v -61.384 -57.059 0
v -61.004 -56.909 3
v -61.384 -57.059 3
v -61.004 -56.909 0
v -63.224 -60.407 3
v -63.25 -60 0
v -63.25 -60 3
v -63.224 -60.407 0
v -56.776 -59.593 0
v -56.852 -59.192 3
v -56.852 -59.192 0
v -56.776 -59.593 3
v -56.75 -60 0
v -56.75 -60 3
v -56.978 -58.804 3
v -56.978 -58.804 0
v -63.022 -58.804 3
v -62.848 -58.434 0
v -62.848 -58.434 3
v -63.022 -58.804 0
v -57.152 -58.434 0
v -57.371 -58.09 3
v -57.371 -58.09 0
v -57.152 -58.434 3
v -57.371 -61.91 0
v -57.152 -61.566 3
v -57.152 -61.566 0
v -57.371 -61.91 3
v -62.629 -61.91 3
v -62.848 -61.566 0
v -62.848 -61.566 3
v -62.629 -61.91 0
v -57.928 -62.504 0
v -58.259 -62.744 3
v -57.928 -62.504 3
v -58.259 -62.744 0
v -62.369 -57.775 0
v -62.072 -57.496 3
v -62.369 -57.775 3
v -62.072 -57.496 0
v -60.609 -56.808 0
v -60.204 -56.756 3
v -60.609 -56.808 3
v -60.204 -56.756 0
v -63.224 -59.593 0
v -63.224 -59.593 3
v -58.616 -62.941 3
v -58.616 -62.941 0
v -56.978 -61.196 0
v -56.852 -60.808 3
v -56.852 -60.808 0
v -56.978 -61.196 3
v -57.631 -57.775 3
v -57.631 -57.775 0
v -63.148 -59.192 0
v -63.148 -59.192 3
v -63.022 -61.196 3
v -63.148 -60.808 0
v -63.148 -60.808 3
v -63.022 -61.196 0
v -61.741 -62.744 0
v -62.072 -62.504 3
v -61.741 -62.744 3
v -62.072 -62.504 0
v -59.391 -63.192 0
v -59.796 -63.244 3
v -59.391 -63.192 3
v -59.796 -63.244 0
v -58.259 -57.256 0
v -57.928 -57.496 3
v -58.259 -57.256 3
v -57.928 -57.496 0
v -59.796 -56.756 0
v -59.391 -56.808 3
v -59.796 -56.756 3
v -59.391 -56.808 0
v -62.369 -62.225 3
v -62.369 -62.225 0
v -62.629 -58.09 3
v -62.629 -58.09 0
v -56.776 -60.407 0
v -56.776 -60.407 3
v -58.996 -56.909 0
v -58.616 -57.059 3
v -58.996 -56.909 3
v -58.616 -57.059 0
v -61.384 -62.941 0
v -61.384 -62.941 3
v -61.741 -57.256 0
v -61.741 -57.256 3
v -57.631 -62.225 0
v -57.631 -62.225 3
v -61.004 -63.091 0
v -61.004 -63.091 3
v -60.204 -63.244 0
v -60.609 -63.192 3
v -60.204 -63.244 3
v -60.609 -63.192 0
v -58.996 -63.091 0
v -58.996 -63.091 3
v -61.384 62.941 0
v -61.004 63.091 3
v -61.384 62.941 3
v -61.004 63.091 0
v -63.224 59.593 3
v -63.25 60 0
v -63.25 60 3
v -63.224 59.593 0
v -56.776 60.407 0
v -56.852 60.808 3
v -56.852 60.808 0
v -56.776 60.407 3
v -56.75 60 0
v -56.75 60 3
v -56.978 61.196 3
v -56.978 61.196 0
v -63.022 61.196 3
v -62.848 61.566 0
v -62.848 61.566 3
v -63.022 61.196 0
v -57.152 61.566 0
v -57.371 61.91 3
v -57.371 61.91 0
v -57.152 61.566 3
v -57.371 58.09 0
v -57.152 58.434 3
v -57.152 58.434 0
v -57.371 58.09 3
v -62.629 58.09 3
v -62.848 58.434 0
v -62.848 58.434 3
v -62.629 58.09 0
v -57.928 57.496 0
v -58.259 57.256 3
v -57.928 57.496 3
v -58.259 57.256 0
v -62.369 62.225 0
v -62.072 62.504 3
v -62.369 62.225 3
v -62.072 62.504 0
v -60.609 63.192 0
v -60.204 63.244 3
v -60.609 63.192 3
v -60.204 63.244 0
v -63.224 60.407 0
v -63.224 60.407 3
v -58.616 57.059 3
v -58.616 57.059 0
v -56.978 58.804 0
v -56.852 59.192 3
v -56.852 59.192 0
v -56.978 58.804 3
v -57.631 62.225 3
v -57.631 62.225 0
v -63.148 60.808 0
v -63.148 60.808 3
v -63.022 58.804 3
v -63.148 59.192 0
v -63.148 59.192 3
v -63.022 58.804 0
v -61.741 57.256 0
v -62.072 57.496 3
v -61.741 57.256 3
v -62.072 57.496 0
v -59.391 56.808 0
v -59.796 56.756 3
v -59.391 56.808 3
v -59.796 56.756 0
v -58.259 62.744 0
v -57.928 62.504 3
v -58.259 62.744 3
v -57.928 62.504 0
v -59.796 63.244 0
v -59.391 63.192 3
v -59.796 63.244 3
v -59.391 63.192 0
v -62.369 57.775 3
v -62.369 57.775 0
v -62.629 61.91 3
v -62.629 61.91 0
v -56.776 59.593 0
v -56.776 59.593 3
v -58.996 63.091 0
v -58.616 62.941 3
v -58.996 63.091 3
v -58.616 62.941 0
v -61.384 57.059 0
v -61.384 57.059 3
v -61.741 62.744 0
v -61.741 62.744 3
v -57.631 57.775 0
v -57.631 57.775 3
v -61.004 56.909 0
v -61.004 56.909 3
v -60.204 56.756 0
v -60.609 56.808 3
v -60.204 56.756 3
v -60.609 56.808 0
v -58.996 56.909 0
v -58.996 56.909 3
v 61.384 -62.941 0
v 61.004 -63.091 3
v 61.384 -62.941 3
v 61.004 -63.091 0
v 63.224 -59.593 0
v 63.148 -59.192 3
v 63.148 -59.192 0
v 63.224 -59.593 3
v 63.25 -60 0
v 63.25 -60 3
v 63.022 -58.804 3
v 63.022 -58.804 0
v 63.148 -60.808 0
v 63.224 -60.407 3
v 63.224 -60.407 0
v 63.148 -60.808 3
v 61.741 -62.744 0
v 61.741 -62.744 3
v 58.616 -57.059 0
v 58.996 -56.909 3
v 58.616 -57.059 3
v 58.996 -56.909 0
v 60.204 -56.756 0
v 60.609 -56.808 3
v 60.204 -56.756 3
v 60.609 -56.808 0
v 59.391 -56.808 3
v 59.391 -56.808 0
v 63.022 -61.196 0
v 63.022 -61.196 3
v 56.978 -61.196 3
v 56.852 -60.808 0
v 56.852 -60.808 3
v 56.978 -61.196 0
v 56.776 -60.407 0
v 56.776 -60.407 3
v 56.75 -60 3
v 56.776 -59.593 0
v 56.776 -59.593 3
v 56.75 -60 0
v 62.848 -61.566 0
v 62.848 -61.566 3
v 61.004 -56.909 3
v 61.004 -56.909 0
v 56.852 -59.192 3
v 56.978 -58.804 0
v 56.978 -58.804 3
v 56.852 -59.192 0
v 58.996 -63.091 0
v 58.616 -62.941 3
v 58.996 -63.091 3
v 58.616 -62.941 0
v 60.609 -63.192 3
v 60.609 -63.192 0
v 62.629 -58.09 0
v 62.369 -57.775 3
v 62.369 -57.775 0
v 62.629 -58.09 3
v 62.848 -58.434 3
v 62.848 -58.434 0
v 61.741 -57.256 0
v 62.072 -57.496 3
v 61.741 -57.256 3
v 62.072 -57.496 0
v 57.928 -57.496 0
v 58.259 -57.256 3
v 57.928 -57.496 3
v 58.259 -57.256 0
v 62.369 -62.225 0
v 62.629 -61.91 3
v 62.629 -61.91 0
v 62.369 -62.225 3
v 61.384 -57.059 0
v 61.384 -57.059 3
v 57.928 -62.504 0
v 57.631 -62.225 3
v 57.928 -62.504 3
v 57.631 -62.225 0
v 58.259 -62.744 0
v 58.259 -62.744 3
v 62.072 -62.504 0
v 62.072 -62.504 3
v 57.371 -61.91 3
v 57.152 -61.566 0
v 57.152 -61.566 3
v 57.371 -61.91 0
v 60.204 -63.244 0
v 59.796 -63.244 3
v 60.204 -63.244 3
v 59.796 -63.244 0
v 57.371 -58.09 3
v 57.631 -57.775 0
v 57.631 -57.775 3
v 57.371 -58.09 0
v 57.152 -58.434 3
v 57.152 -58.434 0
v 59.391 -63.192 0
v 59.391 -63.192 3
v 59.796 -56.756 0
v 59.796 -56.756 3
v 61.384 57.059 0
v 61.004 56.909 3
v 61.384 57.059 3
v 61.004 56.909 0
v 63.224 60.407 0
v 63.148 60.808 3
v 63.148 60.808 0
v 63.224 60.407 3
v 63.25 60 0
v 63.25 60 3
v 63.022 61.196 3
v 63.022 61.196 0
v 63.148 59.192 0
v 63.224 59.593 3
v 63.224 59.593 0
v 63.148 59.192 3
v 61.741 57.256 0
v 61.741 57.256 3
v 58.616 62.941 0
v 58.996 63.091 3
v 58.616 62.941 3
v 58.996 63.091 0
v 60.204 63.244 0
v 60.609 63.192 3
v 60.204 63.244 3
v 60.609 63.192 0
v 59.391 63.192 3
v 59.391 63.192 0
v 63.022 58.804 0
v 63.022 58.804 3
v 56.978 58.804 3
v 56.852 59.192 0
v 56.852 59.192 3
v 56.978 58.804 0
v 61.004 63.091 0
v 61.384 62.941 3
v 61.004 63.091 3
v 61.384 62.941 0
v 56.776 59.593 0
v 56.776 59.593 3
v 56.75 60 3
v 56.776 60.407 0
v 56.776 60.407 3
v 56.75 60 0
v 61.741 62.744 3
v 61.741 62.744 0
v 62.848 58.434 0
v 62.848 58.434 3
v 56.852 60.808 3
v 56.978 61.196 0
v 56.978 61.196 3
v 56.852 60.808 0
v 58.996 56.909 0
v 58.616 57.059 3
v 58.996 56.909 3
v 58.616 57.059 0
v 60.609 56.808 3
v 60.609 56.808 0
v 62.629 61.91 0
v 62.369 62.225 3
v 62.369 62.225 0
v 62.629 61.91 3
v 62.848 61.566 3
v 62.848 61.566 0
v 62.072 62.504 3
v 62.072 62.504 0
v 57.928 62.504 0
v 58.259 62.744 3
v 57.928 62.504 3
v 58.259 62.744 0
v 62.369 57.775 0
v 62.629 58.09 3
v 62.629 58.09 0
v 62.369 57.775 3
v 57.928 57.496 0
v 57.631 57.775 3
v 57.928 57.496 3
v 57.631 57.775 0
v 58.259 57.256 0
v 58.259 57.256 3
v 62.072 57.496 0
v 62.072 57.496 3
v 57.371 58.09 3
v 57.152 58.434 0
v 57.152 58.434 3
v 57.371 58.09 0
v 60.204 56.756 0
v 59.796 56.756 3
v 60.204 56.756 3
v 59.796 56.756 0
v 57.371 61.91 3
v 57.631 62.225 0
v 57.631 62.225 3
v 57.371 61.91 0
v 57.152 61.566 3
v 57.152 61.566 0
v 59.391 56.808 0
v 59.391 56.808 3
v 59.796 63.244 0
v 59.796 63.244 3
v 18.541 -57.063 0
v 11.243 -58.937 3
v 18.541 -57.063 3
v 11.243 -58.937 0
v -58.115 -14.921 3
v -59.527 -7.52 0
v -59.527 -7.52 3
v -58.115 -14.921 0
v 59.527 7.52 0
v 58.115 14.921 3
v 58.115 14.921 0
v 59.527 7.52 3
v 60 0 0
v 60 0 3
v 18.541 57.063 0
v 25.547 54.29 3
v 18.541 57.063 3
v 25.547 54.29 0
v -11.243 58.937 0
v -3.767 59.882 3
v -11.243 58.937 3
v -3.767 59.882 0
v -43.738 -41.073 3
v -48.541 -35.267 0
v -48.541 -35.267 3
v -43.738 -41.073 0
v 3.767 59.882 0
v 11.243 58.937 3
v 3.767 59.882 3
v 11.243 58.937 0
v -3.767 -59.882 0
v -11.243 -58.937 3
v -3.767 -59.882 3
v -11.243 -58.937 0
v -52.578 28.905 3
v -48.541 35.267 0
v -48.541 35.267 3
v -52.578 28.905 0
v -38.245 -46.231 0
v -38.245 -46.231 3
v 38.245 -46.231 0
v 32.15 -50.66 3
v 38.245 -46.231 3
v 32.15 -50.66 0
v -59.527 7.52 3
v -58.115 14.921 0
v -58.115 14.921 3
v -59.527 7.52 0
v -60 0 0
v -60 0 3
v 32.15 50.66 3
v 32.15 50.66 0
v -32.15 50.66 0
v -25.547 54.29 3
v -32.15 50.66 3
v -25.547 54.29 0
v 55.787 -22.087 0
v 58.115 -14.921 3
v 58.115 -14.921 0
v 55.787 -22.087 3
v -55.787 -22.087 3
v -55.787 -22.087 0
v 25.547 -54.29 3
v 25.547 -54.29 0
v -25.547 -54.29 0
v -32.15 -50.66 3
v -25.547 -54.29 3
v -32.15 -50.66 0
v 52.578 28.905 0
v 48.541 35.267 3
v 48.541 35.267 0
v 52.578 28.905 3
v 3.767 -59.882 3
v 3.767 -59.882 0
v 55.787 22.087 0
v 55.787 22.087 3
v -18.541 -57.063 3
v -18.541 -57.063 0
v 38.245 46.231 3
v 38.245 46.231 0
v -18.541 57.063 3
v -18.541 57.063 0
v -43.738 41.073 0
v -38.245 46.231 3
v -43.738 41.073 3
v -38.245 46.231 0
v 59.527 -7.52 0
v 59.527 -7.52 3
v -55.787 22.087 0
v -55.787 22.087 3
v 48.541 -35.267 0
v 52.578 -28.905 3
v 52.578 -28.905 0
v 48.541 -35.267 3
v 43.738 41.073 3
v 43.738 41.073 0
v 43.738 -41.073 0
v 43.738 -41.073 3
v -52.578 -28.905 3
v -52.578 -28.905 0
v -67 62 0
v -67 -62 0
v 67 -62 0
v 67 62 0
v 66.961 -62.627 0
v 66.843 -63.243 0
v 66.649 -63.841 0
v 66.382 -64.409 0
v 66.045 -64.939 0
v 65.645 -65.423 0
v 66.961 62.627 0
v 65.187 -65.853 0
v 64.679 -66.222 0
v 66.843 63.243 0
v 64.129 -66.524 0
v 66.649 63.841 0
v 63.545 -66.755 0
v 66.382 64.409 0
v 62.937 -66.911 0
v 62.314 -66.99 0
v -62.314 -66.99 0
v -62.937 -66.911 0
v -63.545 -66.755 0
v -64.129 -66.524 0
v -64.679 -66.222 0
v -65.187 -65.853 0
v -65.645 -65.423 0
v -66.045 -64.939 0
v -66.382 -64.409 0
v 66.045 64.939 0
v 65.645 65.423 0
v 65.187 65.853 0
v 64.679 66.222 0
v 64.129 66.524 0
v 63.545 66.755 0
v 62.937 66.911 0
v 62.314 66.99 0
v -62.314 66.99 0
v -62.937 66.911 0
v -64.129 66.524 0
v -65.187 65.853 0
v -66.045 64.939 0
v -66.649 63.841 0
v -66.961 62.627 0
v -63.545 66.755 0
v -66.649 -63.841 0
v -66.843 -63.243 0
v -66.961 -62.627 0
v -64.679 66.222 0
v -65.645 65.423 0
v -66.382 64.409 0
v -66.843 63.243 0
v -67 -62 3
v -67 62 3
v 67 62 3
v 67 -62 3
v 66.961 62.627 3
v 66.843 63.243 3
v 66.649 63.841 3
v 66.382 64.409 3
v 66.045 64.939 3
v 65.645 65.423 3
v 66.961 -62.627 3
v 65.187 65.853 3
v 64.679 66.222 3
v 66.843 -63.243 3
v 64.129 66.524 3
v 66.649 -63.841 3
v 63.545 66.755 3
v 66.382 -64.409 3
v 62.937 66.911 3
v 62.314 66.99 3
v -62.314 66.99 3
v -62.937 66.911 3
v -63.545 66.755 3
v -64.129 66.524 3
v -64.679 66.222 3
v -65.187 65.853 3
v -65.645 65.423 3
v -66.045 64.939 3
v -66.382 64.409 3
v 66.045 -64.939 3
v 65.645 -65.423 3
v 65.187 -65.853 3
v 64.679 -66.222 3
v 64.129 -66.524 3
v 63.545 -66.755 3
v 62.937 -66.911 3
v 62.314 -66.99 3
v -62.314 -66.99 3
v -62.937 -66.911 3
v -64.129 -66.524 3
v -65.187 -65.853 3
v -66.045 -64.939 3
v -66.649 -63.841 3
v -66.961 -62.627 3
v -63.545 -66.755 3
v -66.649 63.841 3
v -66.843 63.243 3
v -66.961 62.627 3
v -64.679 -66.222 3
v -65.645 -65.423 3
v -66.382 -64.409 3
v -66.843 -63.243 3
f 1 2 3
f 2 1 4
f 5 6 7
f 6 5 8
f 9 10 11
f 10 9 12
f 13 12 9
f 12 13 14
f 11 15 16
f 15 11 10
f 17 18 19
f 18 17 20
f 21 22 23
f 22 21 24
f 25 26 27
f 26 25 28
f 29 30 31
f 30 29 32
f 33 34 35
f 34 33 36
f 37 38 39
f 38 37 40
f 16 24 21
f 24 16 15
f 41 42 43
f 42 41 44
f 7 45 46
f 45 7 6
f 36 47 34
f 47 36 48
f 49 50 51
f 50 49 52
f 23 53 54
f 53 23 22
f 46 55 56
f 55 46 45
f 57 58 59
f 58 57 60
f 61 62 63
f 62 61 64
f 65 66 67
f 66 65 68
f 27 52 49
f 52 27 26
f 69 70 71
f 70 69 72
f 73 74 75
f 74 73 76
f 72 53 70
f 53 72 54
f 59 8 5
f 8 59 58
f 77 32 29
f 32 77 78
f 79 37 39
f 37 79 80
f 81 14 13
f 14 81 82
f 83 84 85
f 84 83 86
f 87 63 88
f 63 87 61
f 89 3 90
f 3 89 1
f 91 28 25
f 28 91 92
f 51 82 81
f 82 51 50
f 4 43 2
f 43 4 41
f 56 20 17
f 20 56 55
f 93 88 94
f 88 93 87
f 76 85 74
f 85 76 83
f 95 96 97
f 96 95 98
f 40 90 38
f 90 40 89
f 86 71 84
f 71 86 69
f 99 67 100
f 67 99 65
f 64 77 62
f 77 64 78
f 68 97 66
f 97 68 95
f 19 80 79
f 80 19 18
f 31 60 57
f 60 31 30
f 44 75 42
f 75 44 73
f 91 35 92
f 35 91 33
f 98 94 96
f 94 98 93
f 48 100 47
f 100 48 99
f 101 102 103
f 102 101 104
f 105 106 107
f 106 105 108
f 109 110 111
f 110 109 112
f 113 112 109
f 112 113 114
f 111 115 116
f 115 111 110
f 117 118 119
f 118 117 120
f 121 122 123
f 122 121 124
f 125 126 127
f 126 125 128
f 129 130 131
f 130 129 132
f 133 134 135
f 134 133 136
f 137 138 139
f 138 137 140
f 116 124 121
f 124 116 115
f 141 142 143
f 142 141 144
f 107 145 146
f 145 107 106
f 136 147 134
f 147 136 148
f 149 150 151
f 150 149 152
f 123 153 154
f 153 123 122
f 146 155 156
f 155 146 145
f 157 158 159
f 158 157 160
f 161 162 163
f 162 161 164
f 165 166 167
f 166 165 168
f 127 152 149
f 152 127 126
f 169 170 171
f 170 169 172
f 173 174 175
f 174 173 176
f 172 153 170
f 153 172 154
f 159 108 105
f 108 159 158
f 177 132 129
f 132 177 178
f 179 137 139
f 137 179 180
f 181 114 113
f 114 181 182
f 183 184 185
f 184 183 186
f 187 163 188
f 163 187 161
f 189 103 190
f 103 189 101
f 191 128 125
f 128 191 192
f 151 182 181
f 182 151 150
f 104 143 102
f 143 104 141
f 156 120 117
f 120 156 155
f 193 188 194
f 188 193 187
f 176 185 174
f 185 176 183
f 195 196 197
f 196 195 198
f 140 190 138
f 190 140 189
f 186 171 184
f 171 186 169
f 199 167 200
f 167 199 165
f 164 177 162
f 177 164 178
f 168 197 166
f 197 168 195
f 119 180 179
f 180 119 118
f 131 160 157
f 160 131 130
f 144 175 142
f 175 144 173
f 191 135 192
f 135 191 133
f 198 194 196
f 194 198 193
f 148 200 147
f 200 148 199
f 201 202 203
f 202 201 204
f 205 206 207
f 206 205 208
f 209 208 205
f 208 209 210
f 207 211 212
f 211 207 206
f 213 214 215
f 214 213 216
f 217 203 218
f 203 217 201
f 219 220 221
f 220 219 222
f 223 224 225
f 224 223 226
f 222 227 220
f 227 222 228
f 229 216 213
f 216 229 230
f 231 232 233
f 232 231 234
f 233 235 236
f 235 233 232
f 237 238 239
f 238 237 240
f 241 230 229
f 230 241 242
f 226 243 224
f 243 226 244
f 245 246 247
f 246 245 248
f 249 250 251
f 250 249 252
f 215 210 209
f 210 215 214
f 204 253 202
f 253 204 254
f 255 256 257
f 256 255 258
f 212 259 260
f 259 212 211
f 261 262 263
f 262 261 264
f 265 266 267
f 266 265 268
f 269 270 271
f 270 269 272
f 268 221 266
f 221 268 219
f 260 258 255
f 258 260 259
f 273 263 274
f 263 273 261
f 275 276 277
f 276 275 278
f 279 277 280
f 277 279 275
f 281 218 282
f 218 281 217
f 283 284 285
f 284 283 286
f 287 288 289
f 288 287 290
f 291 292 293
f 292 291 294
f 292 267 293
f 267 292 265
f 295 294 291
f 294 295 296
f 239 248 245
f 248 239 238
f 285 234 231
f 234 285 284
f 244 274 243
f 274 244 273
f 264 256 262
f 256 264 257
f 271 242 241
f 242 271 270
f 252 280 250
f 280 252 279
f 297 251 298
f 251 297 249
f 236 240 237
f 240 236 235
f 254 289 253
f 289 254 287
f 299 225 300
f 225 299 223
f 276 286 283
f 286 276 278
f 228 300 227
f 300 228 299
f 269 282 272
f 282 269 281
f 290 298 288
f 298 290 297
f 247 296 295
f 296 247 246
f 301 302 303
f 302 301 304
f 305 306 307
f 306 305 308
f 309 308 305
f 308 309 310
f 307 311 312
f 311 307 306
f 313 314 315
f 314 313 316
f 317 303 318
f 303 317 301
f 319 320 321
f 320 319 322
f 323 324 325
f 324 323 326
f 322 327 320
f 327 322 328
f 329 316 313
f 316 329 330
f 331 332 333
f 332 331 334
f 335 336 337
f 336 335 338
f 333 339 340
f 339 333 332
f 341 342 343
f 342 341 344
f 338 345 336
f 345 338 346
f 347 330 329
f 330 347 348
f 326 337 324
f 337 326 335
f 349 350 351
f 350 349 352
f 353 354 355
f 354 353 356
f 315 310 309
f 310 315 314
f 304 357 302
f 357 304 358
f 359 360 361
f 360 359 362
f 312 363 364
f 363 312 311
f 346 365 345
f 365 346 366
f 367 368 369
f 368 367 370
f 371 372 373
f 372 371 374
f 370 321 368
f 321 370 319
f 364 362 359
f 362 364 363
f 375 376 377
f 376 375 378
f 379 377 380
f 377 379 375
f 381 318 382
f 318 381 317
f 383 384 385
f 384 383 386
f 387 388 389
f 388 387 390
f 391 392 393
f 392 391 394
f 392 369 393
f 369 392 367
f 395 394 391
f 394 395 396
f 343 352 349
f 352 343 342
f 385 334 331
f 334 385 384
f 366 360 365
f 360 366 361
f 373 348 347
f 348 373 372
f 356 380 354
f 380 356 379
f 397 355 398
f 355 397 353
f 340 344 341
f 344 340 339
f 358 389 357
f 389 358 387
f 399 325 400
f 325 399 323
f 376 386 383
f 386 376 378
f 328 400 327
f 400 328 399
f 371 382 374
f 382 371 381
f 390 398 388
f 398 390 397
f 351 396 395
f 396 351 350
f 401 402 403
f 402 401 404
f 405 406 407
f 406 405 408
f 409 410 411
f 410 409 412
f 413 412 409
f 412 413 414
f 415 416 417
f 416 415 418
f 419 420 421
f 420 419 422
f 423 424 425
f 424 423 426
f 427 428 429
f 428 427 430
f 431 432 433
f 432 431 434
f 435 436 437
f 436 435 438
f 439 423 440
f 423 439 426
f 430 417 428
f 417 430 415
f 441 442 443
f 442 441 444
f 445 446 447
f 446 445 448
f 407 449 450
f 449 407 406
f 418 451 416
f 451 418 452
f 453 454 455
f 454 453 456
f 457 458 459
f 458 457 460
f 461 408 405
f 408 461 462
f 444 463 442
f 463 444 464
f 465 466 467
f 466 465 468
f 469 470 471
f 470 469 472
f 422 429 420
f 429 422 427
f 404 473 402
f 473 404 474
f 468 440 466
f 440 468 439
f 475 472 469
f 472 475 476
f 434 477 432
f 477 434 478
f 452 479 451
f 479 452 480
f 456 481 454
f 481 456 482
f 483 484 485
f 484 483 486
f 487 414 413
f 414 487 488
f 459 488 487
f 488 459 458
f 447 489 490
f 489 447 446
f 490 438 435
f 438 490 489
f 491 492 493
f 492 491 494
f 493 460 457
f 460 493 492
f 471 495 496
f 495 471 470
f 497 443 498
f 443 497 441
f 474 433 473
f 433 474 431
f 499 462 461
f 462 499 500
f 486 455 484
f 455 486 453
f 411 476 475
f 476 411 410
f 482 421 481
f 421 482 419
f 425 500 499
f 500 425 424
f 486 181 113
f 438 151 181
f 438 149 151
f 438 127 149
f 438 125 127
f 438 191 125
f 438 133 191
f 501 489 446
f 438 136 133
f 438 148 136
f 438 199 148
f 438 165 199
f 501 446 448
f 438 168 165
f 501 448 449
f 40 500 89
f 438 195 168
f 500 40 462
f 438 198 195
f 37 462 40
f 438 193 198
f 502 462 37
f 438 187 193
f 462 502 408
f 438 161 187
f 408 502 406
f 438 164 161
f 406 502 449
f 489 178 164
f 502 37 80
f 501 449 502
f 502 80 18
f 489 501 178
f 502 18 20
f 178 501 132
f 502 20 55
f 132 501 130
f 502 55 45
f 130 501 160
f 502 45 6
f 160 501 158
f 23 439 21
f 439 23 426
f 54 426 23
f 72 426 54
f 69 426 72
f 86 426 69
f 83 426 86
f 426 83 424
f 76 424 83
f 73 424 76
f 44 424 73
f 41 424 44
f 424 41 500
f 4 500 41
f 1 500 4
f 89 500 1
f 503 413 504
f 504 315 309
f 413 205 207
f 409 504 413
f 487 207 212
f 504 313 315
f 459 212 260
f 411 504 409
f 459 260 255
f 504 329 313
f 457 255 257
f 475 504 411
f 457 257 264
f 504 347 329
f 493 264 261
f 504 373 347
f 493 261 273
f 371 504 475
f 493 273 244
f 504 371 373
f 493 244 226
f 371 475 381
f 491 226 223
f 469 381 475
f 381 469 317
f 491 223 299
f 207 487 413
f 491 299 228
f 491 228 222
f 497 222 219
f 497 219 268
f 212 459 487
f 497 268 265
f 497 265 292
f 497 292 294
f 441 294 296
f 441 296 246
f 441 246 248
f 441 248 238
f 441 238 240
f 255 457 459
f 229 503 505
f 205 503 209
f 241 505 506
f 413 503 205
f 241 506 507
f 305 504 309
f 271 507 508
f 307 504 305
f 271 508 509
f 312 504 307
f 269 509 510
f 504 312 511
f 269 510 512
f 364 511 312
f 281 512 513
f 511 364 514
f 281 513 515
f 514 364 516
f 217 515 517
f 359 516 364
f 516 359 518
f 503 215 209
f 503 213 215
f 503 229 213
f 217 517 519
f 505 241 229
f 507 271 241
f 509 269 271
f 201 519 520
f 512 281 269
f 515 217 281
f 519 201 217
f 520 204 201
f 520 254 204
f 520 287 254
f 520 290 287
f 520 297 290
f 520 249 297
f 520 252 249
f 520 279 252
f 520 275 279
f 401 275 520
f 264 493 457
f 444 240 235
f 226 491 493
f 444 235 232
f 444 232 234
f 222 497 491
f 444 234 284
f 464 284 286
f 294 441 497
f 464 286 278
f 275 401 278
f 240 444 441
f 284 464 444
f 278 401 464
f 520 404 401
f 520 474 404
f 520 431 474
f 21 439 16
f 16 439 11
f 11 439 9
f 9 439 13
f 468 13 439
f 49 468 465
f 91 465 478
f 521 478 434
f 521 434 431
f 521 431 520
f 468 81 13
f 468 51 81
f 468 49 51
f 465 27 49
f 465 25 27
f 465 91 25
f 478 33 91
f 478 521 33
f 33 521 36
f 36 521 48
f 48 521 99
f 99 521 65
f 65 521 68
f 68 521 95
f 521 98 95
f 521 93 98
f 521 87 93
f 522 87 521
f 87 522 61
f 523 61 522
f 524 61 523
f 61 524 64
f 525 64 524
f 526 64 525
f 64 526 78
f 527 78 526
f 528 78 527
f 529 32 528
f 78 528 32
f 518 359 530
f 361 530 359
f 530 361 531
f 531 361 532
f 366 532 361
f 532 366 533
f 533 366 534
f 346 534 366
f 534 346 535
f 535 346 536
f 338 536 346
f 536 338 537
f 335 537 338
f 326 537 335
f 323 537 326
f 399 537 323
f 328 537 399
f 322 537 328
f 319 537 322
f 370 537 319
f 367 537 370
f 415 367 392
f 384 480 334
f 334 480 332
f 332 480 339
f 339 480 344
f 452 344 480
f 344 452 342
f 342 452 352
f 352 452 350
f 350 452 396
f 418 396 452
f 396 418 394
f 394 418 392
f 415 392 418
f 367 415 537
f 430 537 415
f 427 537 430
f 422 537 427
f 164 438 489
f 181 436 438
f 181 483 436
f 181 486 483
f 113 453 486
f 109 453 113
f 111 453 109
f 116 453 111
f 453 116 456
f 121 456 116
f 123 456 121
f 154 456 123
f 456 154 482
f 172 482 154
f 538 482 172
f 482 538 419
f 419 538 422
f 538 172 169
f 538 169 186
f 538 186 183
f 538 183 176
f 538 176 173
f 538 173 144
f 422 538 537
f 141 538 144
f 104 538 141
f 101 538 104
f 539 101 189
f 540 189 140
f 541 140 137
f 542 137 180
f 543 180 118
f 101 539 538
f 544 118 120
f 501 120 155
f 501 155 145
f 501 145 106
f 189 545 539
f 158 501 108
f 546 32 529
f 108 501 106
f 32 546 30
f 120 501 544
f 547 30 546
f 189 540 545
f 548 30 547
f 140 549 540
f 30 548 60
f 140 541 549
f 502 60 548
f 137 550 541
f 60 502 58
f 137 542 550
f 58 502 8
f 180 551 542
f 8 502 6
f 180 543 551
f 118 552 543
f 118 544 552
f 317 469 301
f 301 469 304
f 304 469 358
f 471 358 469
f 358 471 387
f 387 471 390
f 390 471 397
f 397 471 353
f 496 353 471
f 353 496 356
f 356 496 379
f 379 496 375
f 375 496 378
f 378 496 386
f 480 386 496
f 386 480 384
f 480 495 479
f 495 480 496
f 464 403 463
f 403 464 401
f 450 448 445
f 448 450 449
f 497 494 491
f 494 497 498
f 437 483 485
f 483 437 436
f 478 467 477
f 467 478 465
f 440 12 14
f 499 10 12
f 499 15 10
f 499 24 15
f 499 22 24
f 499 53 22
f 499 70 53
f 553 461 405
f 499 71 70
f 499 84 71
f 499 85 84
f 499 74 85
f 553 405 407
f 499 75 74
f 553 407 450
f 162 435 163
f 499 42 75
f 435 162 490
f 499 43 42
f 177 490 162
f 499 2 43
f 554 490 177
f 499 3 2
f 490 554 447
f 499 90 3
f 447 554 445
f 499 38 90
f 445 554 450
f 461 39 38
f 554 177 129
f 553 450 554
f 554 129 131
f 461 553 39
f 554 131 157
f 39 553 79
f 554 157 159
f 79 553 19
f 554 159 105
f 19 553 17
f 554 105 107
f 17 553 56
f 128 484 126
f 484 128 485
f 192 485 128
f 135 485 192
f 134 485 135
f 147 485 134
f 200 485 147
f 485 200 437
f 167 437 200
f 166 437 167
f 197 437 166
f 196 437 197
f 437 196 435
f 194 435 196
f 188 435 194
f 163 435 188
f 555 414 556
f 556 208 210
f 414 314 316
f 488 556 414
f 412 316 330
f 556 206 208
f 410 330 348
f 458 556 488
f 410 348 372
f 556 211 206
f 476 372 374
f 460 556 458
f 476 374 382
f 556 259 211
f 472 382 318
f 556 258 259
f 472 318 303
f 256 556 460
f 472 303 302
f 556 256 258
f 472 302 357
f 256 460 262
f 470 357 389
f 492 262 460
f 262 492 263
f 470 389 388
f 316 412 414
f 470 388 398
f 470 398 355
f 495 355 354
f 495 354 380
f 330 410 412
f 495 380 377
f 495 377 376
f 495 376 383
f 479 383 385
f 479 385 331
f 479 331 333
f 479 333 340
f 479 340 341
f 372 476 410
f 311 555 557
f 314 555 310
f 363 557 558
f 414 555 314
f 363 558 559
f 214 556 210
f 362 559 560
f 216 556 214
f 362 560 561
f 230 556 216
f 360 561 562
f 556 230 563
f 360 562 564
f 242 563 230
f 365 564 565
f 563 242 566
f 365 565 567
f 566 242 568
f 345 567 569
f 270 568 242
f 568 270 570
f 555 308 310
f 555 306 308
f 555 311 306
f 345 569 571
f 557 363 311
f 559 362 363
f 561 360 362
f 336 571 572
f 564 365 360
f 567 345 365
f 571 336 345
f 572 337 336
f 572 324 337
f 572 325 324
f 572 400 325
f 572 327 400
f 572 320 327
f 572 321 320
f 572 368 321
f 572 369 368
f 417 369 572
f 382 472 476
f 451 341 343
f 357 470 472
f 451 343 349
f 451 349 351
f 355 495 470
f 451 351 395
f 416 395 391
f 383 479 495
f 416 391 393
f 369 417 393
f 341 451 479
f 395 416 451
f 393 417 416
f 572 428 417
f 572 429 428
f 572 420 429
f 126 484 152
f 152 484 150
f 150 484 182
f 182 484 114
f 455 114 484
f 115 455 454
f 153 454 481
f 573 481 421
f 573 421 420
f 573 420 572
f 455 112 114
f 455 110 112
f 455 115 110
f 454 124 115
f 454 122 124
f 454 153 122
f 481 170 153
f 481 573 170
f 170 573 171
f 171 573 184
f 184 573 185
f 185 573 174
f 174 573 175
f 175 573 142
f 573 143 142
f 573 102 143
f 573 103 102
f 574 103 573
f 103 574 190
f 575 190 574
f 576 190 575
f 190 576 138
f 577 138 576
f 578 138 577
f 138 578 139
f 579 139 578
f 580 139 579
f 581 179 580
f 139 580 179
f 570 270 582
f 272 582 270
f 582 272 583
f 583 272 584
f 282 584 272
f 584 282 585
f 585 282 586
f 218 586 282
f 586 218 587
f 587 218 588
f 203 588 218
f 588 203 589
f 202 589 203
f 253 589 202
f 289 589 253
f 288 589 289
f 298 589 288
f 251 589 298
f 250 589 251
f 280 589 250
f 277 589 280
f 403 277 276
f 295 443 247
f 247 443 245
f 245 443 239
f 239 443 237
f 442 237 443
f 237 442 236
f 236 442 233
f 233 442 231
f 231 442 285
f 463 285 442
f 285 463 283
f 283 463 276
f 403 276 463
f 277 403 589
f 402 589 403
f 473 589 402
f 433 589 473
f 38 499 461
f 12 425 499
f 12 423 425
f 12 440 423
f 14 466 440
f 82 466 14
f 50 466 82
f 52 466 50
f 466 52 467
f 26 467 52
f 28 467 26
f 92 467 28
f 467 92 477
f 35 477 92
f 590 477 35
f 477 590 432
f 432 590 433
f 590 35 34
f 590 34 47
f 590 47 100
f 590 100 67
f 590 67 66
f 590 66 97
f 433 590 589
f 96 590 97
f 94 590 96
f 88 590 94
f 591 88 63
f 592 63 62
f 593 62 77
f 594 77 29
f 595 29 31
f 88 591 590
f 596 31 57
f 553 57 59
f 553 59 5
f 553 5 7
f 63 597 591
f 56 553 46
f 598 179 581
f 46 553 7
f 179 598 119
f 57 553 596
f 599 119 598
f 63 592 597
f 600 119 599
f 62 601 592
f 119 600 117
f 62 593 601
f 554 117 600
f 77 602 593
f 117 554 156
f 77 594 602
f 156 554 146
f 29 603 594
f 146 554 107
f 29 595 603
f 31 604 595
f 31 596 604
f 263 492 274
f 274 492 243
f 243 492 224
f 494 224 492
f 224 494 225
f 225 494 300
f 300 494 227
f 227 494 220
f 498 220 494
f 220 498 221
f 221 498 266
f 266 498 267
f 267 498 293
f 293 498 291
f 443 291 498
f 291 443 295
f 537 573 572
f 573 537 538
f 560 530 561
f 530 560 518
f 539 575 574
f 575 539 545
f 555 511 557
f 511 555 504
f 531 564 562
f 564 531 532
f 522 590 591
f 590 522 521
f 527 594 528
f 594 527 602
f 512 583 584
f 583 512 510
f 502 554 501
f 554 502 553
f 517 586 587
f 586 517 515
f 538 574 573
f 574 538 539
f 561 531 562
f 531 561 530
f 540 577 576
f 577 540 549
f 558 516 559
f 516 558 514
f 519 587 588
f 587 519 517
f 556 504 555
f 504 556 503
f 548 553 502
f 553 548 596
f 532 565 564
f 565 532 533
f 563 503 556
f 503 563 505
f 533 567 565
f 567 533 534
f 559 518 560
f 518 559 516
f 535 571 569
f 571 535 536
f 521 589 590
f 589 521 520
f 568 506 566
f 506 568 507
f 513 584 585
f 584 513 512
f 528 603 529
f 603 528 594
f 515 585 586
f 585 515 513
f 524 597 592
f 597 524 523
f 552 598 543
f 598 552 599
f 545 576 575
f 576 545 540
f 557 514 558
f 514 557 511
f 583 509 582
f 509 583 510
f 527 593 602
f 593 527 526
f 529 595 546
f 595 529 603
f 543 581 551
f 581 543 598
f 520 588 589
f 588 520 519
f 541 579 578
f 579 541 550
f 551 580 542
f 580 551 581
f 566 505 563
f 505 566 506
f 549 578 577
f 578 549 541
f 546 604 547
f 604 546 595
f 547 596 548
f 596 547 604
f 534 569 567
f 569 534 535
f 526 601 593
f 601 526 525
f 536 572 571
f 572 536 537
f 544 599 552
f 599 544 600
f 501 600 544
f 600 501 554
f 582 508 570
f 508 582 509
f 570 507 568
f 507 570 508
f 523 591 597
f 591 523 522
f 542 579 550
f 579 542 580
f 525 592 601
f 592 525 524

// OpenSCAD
$fn = 50;

difference() {
	union() {
		hull() {
			translate(v = [-62.0, 62.0, 0]) {
				cylinder(h = 3, r = 5);
			}
			translate(v = [62.0, 62.0, 0]) {
				cylinder(h = 3, r = 5);
			}
			translate(v = [-62.0, -62.0, 0]) {
				cylinder(h = 3, r = 5);
			}
			translate(v = [62.0, -62.0, 0]) {
				cylinder(h = 3, r = 5);
			}
		}
	}
	union() {
		translate(v = [-60.0, -60.0, -100.0]) {
			cylinder(h = 200, r = 3.25);
		}
		translate(v = [-60.0, 60.0, -100.0]) {
			cylinder(h = 200, r = 3.25);
		}
		translate(v = [60.0, -60.0, -100.0]) {
			cylinder(h = 200, r = 3.25);
		}
		translate(v = [60.0, 60.0, -100.0]) {
			cylinder(h = 200, r = 3.25);
		}
		translate(v = [-60.0, -60.0, -100.0]) {
			cylinder(h = 200, r = 1.8);
		}
		translate(v = [-60.0, 60.0, -100.0]) {
			cylinder(h = 200, r = 1.8);
		}
		translate(v = [60.0, -60.0, -100.0]) {
			cylinder(h = 200, r = 1.8);
		}
		translate(v = [60.0, 60.0, -100.0]) {
			cylinder(h = 200, r = 1.8);
		}
		cylinder(h = 3, r = 60.0);
	}
}
